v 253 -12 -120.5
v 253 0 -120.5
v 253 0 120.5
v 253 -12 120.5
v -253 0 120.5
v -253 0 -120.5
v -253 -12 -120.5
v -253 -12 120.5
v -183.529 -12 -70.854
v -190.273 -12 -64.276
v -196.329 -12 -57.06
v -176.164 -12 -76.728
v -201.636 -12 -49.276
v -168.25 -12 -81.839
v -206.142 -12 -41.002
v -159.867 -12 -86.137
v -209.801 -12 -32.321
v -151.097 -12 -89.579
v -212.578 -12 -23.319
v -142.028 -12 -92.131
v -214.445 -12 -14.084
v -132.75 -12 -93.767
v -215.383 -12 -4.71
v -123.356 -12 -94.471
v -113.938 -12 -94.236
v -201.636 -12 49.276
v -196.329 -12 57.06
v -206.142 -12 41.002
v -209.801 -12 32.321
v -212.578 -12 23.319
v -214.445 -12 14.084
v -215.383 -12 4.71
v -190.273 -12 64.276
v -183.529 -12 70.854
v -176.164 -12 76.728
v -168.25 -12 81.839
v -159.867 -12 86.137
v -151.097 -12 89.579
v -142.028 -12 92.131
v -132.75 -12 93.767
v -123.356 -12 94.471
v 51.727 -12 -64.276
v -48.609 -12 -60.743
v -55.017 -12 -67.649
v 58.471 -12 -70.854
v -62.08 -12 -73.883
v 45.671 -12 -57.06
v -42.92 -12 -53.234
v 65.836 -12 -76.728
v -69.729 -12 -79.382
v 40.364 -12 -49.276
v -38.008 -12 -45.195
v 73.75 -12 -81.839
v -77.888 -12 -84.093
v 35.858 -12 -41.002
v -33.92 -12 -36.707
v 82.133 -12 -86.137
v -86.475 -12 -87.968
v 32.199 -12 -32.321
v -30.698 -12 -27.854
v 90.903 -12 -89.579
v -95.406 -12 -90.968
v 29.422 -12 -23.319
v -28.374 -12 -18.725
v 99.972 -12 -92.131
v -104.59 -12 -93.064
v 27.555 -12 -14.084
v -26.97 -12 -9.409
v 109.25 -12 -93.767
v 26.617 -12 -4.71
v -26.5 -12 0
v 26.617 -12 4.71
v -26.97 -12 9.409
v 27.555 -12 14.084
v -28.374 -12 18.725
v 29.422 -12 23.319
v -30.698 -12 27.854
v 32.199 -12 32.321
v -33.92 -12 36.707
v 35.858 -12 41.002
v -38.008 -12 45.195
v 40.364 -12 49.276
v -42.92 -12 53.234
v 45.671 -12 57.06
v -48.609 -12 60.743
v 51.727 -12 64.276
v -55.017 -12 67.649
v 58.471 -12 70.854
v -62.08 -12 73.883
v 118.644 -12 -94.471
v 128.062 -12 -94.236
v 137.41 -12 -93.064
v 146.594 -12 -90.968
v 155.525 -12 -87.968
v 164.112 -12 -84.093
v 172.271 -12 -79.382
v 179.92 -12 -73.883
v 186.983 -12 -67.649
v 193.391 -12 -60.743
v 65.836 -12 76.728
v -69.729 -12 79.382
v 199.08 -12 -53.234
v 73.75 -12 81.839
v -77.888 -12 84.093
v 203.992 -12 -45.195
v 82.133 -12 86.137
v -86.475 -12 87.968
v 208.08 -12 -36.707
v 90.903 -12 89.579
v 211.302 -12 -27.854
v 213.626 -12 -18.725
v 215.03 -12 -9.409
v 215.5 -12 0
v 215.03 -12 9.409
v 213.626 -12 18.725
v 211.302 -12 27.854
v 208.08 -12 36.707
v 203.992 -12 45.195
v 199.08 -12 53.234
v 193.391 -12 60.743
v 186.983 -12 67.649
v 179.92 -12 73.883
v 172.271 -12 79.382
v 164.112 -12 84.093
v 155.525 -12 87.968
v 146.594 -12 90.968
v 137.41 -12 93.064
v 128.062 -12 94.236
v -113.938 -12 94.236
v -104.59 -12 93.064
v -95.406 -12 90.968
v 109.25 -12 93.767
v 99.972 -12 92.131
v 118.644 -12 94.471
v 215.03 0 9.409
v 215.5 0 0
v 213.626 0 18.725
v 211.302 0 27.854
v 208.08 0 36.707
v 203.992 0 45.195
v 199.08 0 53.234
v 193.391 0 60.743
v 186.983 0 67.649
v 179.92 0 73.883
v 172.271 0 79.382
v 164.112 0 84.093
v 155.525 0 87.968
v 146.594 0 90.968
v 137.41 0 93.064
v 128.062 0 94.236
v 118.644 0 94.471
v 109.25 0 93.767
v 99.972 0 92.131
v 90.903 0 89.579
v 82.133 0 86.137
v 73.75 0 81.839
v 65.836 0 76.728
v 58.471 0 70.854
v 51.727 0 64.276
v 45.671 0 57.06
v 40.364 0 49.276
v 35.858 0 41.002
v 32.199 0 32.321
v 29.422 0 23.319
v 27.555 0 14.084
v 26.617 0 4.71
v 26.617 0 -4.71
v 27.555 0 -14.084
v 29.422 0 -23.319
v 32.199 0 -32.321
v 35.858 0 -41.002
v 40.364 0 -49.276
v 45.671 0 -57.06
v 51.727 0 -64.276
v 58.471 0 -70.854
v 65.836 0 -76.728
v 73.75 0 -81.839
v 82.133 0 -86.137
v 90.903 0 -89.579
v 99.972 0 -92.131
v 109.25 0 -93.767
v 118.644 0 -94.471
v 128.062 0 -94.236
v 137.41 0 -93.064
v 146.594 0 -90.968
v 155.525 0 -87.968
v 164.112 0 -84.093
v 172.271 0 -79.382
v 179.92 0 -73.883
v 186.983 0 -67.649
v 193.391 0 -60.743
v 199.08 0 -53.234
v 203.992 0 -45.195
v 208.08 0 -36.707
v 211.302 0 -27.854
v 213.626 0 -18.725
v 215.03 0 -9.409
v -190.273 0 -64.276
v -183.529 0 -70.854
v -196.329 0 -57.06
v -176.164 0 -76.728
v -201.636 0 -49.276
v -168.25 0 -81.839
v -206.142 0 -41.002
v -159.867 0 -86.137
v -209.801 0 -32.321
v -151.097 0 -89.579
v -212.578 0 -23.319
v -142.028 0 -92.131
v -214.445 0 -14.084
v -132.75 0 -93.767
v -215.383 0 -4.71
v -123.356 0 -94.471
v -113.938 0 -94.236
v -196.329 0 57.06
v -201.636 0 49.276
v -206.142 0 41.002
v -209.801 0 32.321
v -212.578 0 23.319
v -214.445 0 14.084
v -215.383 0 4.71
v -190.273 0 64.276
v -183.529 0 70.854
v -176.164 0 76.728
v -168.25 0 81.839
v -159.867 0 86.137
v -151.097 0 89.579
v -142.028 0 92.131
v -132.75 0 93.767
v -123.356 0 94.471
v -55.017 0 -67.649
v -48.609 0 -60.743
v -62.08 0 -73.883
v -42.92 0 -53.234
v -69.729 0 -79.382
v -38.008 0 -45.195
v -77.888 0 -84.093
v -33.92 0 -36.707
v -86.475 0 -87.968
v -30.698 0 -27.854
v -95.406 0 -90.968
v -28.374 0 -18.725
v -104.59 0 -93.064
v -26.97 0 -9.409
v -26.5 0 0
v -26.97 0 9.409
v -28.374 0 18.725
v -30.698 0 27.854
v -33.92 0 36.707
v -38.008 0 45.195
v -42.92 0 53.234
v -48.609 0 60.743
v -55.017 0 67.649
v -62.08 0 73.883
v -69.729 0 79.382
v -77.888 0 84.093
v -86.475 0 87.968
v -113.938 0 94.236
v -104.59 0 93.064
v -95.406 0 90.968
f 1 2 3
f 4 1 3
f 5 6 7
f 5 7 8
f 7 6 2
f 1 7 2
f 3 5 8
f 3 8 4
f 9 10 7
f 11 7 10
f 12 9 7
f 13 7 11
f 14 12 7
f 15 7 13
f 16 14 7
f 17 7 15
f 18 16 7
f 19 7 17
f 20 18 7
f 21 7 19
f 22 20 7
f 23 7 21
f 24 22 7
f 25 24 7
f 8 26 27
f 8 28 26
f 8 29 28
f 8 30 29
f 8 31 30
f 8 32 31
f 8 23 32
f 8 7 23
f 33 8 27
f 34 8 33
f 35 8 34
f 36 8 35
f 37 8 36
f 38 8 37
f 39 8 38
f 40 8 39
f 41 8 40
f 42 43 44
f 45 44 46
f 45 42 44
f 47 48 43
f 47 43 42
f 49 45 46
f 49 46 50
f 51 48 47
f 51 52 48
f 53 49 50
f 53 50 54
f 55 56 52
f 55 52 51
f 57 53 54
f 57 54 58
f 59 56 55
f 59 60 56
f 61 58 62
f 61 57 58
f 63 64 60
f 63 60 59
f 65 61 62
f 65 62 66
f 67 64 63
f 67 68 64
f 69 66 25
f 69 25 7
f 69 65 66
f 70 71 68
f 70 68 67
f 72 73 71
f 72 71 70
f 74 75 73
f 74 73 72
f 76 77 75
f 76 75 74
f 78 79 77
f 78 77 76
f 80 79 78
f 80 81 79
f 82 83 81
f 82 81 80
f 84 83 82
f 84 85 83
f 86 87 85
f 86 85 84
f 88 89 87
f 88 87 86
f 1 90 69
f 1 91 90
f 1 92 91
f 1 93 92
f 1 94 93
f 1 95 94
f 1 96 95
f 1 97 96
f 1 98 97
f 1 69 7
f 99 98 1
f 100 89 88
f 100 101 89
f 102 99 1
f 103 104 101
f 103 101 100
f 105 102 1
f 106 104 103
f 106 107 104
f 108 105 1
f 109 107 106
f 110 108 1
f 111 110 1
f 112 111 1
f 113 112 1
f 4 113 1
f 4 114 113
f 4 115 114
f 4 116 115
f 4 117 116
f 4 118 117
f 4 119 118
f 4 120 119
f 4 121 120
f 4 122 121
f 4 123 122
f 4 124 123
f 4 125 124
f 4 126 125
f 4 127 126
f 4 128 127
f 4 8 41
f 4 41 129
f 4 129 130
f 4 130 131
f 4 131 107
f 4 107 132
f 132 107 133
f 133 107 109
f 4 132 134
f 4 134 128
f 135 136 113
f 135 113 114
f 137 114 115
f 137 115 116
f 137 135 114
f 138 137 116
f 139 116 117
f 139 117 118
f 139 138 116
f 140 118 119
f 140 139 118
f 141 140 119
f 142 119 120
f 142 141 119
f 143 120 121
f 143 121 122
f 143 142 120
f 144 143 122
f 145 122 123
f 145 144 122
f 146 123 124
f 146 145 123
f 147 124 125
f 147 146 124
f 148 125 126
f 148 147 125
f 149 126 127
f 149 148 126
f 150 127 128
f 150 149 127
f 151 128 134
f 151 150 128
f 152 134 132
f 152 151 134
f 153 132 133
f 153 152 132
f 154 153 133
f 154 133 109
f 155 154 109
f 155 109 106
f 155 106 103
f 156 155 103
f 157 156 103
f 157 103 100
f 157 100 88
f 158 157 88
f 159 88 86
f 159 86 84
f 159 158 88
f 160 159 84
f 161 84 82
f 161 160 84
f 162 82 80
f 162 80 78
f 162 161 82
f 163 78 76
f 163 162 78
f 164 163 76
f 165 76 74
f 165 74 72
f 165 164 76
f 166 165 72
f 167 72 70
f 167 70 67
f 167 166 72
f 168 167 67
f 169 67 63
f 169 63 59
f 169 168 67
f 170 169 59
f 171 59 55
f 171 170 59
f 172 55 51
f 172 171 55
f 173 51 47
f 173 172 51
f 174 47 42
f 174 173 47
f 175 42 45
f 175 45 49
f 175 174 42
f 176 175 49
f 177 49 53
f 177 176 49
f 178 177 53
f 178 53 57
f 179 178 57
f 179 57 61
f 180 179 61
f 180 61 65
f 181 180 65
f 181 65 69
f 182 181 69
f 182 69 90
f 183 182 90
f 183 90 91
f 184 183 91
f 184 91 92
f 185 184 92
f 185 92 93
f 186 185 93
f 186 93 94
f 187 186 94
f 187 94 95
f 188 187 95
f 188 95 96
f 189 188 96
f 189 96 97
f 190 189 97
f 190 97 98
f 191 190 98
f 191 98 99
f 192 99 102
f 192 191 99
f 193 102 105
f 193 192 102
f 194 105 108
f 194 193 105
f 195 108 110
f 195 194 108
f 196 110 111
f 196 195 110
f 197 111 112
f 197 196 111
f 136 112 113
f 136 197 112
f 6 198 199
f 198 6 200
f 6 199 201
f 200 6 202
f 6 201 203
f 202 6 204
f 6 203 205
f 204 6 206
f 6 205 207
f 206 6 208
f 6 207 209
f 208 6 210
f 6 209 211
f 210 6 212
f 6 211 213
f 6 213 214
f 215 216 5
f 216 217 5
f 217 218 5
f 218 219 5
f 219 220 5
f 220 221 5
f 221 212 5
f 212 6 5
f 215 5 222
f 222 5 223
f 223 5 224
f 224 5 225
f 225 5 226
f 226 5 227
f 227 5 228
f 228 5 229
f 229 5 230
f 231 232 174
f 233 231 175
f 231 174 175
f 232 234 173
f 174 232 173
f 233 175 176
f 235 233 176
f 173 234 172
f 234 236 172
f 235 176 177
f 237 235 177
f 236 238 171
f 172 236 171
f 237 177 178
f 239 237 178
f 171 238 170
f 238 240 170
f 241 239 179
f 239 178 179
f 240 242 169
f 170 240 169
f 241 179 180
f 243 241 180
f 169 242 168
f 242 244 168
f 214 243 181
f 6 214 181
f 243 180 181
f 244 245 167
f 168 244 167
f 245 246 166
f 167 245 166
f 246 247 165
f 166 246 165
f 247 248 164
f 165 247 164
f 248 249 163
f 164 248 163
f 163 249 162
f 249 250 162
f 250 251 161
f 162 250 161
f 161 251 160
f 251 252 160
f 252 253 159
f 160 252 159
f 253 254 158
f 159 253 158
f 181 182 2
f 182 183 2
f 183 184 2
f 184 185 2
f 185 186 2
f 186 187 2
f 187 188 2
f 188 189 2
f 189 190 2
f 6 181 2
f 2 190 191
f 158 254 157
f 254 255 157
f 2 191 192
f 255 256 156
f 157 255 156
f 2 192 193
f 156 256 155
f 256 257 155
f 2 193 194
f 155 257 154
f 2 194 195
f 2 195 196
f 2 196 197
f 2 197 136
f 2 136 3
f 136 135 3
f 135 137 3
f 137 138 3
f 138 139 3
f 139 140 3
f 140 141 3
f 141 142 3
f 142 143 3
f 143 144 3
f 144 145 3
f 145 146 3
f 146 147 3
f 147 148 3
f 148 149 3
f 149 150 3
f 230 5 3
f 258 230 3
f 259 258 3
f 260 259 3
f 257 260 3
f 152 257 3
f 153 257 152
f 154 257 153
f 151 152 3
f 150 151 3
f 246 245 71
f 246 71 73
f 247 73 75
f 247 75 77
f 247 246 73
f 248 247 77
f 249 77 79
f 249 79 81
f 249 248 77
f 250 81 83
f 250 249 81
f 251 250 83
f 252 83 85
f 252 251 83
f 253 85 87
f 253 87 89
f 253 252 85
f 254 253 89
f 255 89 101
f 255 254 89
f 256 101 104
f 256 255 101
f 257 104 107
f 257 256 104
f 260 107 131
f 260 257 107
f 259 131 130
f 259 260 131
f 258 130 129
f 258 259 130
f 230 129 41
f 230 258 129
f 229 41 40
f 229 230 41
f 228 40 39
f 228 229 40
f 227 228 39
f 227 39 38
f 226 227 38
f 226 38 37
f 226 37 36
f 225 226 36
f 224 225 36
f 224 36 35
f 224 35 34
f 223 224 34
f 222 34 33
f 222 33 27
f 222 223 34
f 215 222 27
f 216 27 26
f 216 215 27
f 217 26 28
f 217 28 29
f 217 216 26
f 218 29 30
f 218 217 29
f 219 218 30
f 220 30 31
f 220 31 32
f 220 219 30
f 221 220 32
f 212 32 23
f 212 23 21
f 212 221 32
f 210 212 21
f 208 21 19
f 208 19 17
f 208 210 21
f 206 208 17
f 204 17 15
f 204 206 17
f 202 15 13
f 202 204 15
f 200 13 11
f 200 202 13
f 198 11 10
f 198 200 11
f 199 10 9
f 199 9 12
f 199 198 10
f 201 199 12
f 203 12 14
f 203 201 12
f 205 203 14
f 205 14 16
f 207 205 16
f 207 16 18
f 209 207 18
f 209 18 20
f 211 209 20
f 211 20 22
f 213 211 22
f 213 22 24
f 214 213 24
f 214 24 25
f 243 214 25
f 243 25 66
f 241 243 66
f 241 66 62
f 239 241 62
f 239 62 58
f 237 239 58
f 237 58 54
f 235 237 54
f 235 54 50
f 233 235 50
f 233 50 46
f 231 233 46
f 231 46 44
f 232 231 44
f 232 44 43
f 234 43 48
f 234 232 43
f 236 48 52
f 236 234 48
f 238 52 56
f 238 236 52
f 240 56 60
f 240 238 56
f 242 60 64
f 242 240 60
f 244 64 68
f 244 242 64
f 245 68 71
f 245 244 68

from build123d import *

# Parameters (mm, degrees)
F0_W     = 506
F0_H     = 241
F0_R     = 111
F0_R_2   = 94.5
F1_DEPTH = 12


with BuildPart() as f1:
    # F0 (on Front) → F1 (new body)
    with BuildSketch(Plane.XZ):
        Rectangle(F0_W, F0_H)
        with Locations((-121, 0)):
            Circle(F0_R, mode=Mode.SUBTRACT)
        with Locations((121, 0)):
            Circle(F0_R, mode=Mode.SUBTRACT)
        with Locations((-121, 0)):
            Circle(F0_R)
        with Locations((-121, 0)):
            Circle(F0_R_2, mode=Mode.SUBTRACT)
        with Locations((121, 0)):
            Circle(F0_R)
        with Locations((121, 0)):
            Circle(F0_R_2, mode=Mode.SUBTRACT)
    extrude(amount=F1_DEPTH)


solid = f1.part
